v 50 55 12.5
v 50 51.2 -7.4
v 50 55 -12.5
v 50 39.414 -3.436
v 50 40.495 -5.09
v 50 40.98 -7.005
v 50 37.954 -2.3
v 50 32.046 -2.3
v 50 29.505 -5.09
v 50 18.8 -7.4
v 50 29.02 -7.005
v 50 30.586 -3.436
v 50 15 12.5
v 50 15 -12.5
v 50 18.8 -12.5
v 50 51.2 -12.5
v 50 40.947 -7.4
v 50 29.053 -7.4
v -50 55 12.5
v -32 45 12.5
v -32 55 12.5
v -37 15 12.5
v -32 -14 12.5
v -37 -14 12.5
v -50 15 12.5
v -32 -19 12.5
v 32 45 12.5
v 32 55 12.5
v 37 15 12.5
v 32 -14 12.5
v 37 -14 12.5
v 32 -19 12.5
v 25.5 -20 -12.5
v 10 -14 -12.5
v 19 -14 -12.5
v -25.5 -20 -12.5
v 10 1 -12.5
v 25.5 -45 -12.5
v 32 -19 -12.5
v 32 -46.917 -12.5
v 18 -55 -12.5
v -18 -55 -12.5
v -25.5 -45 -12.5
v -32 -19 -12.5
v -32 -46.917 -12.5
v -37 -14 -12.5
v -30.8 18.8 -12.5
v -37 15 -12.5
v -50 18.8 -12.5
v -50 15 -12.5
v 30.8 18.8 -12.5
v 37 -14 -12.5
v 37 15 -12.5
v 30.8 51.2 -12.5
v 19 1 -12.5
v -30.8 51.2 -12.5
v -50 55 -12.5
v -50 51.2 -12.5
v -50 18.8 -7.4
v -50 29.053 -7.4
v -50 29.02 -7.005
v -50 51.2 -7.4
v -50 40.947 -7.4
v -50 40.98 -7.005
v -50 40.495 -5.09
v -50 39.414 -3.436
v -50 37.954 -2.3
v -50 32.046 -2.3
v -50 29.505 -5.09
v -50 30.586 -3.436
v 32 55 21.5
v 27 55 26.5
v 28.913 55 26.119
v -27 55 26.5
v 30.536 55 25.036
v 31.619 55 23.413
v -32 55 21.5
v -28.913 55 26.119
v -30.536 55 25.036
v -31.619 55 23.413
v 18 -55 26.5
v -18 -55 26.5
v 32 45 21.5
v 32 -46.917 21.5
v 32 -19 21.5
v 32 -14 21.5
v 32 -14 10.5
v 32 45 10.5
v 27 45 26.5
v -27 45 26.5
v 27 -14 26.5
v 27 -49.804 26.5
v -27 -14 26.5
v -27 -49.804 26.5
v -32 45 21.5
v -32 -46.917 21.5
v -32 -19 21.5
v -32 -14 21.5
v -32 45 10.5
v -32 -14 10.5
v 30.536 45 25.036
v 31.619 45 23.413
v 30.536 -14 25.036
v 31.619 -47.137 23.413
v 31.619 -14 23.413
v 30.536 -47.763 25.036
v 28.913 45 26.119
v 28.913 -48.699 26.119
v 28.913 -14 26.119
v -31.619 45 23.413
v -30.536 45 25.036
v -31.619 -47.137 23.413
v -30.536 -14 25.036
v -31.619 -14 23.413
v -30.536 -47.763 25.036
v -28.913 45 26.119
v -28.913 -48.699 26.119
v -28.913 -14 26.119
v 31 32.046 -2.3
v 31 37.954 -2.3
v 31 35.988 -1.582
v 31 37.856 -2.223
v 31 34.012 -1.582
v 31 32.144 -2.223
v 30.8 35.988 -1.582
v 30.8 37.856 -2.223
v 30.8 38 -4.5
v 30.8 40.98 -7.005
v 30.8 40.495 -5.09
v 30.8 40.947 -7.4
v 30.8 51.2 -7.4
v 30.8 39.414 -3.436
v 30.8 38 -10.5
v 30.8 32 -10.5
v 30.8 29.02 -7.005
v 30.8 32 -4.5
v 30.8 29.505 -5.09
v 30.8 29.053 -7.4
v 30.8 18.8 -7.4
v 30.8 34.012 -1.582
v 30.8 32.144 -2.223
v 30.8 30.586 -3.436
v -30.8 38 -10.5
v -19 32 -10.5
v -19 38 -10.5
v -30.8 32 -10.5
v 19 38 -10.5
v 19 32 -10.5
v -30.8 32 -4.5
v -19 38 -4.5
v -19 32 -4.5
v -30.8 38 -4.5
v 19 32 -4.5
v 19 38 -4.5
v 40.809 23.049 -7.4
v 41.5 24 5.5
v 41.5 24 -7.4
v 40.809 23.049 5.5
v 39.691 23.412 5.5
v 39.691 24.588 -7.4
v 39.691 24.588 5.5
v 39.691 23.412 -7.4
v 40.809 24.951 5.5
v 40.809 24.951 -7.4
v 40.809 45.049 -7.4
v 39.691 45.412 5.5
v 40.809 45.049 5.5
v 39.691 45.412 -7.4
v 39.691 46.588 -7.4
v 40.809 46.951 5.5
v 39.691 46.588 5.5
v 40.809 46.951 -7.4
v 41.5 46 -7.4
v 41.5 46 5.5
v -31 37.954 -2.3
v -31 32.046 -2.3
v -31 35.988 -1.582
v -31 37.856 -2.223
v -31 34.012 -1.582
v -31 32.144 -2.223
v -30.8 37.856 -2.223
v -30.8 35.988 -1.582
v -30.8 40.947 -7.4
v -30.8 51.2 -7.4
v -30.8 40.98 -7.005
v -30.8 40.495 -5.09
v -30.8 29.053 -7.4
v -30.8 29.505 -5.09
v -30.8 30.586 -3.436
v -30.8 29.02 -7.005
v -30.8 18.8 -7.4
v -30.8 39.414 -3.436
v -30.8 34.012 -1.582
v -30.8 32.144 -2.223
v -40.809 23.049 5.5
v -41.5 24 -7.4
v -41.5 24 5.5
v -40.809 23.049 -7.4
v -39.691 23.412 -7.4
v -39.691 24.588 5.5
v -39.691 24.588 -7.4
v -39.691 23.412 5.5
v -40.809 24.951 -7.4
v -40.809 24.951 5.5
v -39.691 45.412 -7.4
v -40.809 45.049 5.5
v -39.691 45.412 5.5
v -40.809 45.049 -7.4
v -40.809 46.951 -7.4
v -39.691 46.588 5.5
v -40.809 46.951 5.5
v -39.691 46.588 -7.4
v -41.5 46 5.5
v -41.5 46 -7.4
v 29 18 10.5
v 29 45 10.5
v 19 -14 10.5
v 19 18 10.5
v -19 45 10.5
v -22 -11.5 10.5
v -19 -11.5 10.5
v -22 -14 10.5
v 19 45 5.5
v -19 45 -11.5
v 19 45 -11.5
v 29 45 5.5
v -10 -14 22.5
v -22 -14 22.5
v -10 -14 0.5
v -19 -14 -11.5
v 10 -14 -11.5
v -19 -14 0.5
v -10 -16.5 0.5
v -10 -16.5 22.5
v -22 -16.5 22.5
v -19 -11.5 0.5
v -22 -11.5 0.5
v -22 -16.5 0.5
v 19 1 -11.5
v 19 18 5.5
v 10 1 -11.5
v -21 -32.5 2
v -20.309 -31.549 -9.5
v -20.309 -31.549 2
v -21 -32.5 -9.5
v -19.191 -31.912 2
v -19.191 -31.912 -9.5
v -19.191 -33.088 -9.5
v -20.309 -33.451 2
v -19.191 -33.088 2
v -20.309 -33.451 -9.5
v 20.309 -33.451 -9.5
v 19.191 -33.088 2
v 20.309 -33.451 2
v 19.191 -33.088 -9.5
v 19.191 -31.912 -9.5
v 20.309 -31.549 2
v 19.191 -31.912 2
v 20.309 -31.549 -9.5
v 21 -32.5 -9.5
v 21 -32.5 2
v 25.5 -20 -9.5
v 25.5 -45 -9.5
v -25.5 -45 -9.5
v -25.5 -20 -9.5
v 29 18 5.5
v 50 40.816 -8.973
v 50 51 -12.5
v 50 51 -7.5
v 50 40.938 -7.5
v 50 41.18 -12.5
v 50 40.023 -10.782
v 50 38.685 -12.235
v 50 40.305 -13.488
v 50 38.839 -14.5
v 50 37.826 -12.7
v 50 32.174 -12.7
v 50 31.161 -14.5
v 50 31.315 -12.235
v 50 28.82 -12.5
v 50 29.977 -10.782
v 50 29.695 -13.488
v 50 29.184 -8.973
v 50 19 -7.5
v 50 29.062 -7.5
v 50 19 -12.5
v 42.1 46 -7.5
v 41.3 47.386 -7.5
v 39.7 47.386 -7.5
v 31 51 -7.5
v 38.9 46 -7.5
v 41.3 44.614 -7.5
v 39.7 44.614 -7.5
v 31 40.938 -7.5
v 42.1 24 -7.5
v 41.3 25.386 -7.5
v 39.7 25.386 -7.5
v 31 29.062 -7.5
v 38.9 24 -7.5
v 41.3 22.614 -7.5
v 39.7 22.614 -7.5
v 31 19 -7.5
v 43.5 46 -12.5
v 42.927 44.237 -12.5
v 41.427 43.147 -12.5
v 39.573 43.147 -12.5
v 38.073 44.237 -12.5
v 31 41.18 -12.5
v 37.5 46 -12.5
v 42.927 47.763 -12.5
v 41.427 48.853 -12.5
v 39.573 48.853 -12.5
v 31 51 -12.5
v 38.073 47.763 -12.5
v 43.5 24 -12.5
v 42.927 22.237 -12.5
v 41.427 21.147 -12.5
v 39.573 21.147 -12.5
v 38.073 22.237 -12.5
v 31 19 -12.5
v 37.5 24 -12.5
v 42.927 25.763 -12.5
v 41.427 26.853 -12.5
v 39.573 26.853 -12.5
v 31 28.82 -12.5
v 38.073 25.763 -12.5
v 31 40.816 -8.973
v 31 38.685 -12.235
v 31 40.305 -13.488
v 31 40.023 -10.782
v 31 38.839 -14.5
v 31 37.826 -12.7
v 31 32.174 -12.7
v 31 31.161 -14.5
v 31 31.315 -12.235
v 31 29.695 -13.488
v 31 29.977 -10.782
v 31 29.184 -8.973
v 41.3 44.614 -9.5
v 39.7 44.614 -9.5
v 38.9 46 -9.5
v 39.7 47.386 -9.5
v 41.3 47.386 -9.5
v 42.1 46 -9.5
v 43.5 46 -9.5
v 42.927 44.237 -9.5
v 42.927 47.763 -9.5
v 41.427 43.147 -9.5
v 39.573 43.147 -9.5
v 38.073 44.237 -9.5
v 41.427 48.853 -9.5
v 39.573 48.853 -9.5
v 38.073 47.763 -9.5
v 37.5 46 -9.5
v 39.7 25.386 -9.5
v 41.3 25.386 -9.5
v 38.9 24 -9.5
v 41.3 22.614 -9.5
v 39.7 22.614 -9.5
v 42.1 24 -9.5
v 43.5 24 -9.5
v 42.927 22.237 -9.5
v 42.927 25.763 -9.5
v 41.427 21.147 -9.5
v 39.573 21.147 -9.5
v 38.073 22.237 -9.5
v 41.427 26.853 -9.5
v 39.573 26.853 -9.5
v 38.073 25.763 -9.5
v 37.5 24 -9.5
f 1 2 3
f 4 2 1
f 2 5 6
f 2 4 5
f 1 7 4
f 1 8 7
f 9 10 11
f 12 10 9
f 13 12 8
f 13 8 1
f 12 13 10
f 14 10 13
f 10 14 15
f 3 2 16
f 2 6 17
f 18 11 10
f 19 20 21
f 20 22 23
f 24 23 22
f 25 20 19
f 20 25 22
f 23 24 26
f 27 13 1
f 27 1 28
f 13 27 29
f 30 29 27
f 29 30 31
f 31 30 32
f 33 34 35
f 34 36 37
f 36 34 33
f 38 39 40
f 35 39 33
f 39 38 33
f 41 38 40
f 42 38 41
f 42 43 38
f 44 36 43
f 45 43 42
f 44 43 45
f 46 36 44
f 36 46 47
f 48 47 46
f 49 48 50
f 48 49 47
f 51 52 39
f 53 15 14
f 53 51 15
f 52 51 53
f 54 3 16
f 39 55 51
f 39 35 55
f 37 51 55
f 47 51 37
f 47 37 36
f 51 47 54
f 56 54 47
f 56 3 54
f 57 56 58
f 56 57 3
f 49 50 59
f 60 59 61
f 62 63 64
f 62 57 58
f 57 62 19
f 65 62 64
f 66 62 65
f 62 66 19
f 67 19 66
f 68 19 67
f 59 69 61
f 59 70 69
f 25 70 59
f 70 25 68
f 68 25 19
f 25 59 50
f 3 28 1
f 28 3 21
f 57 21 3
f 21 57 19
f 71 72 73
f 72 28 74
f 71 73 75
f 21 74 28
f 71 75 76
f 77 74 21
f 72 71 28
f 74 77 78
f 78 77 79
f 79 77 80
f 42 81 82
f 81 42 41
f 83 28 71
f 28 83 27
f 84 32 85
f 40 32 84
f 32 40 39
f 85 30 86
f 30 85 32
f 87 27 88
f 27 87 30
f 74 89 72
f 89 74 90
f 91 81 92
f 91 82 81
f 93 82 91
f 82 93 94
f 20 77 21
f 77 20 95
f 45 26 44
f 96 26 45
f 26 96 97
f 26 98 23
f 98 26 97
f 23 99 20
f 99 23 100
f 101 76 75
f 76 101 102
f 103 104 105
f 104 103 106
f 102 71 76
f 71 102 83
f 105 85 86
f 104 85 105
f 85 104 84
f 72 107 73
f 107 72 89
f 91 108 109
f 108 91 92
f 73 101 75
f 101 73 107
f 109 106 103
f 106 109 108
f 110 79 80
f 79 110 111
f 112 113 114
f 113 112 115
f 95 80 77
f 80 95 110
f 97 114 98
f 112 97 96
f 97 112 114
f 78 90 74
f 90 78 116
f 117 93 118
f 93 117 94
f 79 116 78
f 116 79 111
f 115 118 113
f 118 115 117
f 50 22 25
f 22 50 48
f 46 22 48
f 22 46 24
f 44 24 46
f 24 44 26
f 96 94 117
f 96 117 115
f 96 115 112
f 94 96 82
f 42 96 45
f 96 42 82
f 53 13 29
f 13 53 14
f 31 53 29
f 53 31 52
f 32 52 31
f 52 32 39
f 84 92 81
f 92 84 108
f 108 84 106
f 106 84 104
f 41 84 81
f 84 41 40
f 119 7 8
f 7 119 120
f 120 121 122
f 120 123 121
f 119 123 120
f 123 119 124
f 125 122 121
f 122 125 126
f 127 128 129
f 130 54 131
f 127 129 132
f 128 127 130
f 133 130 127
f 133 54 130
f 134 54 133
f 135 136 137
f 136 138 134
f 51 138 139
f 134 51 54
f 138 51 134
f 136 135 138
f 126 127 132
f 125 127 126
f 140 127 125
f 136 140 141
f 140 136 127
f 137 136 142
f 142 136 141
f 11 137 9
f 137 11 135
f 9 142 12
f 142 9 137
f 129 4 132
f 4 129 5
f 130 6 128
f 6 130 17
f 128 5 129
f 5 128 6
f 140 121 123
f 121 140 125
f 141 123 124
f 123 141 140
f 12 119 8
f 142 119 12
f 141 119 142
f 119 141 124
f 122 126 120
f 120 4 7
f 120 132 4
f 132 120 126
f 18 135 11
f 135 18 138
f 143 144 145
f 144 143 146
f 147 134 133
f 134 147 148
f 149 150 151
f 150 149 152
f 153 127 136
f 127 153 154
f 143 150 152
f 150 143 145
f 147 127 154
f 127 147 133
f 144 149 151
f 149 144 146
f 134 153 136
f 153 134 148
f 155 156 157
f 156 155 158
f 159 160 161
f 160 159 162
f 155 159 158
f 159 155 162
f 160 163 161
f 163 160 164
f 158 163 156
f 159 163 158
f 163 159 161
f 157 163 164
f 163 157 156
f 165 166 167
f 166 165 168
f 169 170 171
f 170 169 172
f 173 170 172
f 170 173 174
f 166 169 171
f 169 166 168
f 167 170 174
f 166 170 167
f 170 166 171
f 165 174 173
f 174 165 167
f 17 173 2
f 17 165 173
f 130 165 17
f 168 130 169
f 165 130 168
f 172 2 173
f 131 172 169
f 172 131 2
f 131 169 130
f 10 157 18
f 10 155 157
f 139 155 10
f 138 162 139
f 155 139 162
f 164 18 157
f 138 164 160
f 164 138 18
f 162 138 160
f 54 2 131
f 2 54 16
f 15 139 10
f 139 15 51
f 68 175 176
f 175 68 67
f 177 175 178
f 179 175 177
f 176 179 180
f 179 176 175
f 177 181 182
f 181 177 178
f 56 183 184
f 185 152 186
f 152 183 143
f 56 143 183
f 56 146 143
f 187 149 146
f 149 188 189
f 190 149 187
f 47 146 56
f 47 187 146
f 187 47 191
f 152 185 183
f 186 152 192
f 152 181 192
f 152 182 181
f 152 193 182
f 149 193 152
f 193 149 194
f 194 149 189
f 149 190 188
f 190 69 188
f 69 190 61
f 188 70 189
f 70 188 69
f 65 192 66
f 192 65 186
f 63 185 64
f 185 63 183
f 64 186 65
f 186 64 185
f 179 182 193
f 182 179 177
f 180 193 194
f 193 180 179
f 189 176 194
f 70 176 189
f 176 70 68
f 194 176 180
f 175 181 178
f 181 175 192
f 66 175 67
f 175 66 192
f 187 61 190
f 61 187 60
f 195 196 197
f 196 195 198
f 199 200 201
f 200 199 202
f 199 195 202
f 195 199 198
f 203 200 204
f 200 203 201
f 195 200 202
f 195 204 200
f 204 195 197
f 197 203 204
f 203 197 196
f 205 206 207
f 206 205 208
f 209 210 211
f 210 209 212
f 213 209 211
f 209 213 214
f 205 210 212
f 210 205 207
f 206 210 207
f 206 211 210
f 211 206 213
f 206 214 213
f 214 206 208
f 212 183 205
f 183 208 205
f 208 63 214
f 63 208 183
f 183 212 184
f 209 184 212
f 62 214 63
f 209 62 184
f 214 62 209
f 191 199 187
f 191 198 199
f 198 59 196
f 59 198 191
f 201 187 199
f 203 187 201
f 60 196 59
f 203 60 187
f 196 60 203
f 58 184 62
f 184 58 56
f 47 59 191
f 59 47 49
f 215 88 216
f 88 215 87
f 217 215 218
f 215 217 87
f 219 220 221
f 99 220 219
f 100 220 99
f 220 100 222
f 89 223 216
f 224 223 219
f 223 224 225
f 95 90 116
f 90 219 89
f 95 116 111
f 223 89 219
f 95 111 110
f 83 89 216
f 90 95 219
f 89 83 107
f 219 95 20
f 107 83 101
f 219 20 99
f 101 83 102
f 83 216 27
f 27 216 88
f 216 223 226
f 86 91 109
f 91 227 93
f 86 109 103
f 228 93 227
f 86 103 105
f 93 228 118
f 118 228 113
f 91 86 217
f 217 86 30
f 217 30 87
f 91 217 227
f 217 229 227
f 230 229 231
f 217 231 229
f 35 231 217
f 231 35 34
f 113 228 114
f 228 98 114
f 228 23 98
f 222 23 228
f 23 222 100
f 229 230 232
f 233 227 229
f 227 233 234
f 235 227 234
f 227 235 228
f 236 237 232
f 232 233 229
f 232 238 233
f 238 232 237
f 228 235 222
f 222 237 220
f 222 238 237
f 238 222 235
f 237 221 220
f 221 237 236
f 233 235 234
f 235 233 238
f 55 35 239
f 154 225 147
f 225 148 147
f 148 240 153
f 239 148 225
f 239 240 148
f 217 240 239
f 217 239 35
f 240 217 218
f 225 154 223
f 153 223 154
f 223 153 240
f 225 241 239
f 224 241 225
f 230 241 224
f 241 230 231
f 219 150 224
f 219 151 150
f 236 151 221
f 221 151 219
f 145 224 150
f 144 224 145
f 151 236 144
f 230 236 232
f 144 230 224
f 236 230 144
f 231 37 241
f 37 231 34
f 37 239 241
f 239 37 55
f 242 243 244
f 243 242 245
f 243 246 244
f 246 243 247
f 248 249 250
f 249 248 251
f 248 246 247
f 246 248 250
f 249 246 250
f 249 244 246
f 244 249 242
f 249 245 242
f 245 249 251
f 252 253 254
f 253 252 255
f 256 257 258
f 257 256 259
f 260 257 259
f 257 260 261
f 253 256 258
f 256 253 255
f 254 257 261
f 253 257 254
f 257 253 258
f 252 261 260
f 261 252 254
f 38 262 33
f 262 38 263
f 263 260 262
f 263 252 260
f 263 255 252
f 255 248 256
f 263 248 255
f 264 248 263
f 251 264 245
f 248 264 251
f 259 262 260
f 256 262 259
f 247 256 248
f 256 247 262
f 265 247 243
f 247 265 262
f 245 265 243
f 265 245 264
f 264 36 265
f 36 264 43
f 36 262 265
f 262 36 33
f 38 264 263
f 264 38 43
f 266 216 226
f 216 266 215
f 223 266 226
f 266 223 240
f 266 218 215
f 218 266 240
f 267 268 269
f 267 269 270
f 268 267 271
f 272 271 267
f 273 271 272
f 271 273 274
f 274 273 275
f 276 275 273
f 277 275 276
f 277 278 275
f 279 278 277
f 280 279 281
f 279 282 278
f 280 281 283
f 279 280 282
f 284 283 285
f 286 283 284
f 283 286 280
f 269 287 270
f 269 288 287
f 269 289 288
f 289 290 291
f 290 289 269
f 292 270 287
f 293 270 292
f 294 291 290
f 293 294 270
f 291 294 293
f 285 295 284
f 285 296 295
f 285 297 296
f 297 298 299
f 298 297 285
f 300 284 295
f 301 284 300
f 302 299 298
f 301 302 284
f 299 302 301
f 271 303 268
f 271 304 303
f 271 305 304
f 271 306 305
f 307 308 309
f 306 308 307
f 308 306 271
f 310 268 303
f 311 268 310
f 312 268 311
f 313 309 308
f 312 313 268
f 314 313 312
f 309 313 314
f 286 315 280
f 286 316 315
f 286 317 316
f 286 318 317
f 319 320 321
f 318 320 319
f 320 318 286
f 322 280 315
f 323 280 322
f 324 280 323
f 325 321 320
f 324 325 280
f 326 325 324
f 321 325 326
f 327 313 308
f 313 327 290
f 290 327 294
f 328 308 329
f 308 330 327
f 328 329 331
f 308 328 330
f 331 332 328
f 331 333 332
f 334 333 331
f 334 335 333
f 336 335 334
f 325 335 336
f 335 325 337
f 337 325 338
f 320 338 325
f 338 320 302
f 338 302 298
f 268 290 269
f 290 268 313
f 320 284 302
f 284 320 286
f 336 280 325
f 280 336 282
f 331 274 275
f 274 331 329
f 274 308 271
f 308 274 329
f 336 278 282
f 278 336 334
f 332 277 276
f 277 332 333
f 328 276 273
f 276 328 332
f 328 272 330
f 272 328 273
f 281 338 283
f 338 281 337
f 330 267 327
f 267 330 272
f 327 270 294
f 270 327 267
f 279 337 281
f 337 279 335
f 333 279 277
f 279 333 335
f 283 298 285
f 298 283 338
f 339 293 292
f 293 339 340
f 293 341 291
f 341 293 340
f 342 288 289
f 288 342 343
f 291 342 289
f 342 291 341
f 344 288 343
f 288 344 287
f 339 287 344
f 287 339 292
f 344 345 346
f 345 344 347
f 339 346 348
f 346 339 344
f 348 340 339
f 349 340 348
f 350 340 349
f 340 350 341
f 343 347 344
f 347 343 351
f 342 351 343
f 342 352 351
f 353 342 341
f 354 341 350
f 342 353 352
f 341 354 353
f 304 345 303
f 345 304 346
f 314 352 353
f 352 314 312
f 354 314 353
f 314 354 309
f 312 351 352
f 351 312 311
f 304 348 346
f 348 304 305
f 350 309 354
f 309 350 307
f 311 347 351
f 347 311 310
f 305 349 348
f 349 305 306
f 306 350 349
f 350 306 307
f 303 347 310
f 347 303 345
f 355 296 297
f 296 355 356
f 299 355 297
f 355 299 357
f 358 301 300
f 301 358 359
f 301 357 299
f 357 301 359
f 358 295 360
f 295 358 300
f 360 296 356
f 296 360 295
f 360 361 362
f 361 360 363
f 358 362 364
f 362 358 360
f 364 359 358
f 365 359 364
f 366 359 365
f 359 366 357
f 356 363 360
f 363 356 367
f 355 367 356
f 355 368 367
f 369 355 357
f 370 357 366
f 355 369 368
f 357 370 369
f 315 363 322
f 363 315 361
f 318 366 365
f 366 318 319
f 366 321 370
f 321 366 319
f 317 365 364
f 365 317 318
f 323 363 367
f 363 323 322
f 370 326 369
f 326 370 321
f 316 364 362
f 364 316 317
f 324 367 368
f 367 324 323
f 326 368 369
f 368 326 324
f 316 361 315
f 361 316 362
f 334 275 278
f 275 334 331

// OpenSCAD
body_width = 100;
body_length = 110;
body_height = 25;

small_screw_d_thread = 2;
small_screw_d_pass = 3.2;
small_screw_length = 13;
small_screw_head_length = 3;
small_screw_head_d = 6;

motor_d = 12;
motor_height = 10;
motor_length = 19;
motor_back_offset = 20;

cabel_channel_width = 6;

motor_holder_width = 32;
motor_holder_bulge = 16;

battery_box_width = 64;
battery_box_length = 59;
battery_box_depth = 2;
battery_box_height = 14;
battery_box_rounding_r = 5;
battery_box_back_offset = 10;
battery_box_cable_width = 12;
battery_box_cable_length = 5;
battery_box_cable_offset = 10;
battery_box_wall_width = 5;

electronic_cutout_width = 38;
electronic_cutout_length = 59;
electronic_cutout_depth = 22;

gyroscope_width = 16;
gyroscope_length = 27; 
gyroscope_depth = 5;
gyroscope_offset = 10;

button_cutout_length = 15;
button_cutout_width =  9;
button_x_offset = (electronic_cutout_width - button_cutout_width) / 2;
button_y_offset = -(electronic_cutout_length - button_cutout_length) / 2;

ball_wheel_width = 51;
ball_wheel_length = 25;
ball_wheel_depth = 3;
ball_wheel_front_offset = 10;
ball_wheel_screw_distance = 40;

front_width = 36;
front_angle = 30;
front_cutout_depth = tan(front_angle) * (battery_box_width - front_width) / 2;

tolerance = 0.2;

module mirror_copy(vec) {
        mirror(vec) {
            children();
        }
        children();
}

module small_screw_pass_cutout() {
    cylinder(d = small_screw_d_pass, h = small_screw_length, center = true);
    translate([0,0, (small_screw_length + small_screw_head_length) / 2])
        cylinder(d = small_screw_head_d, h = small_screw_head_length, center = true);
}

module small_screw_thread_cutout() {
    cylinder(d = small_screw_d_thread, h = small_screw_length, center = true);
}

module motor_holder() {
    difference() {
        union() {
            cube([motor_length, motor_holder_width, motor_height / 2], center = true);

            translate([0,0,motor_height / 4])
            rotate([0, 90, 0])
                cylinder(d = motor_holder_bulge, h = motor_length, center = true);
        }

        translate([0,0,motor_height / 4])
        rotate([0, 90, 0]) {           
            difference() {
                cylinder(d = motor_d, h = motor_length, center = true);
                    
                mirror_copy([1,0,0]) {
                    translate([(motor_height + 2) / 2 + tolerance, 0, 0])
                    cube([2, motor_d, motor_length], center = true);
                }
            }
        }

        translate([0,0, motor_height / 4 + motor_height / 2])
            cube([motor_length, motor_holder_width, motor_height], center = true);

        translate([0,0, - motor_holder_bulge / 2 + (motor_d - motor_height) / 2 ])
            cube([motor_length, motor_holder_width, motor_height / 2], center = true);

        mirror_copy([0, 1, 0])
        translate([0, motor_holder_width / 2 - 5, (small_screw_length) / 2 + small_screw_head_length - motor_height / 4 ])
        rotate([0, 180, 0])
            small_screw_pass_cutout();
    }
}

module body() {
    width = body_width;
    length = body_length;
    height = body_height;

    module top_rounding() {
        rotate([90, 0, 0]) {
            difference() {
                translate([battery_box_rounding_r / 2, battery_box_rounding_r / 2, 0])
                    cube([battery_box_rounding_r, battery_box_rounding_r, body_length], center = true);

                cylinder(r = battery_box_rounding_r, h = body_length, center=true);
            }
        }
    }

    module side_cutouts() {
        translate([0, 0, battery_box_height / 2])
        linear_extrude(height + battery_box_height, [0, 0, 1], center = true)
        polygon([
            [body_width / 2, -body_length / 2],
            [front_width / 2, -body_length / 2],
            [battery_box_width / 2, -body_length / 2 + front_cutout_depth], 
            [battery_box_width / 2, body_length / 2 - battery_box_back_offset - battery_box_length - battery_box_wall_width],
            [battery_box_width / 2 + battery_box_wall_width, body_length / 2 - battery_box_back_offset - battery_box_length],
            [battery_box_width / 2 + battery_box_wall_width, body_length / 2 - 2 * motor_back_offset],
            [width / 2, body_length / 2 - 2 * motor_back_offset],
        ]);
    }

    module motor_cutouts() {
        rotate([0, 90, 0]) {
            // cable shaft
            channel_length = body_width / 2 - motor_length;

            translate([0, 0, (- channel_length - motor_length) / 2 ])
                cube([cabel_channel_width, cabel_channel_width, channel_length], center = true);
            
            difference() {
                cylinder(d = motor_d, h = motor_length + 2 * tolerance, center = true);
                
                mirror_copy([1,0,0]) {
                    translate([(motor_height + 2) / 2 + tolerance, 0, 0])
                    cube([2, motor_d, motor_length], center = true);
                }
            }
        }
        
        mirror_copy([0,1,0])
        translate([0, motor_holder_width / 2 - 5, small_screw_length / 2]) {
            small_screw_thread_cutout();
        }

        translate([0, 0, -motor_height / 4])
            cube([motor_length + 2 * tolerance, motor_holder_width + 2 * tolerance, motor_height / 2 + tolerance], center = true);
    }
    
    module battery_box_cutout() {
        translate([0,0, battery_box_height / 2])
            cube([battery_box_width, battery_box_length, battery_box_depth + battery_box_height], center = true);

        translate([- battery_box_width / 2 + battery_box_cable_offset + battery_box_cable_width / 2, - battery_box_length / 2, 0])
            cube([battery_box_cable_width, battery_box_cable_length, electronic_cutout_depth], center = true);
    }
    
    module ball_wheel_cutout() {
        cube([ball_wheel_width, 
              ball_wheel_length,
              ball_wheel_depth], center = true);

        mirror_copy([1,0,0])
            translate([ball_wheel_screw_distance / 2,0,small_screw_length / 2])
            small_screw_thread_cutout();
    }
    
    module electronic_cutout() {
        cube([electronic_cutout_width,
              electronic_cutout_length,
              electronic_cutout_depth],
             center = true);

        translate([button_x_offset, button_y_offset, 0])
            cube([button_cutout_width, button_cutout_length, body_height], center = true);
    }

    module gyroscope_cutout() {
        cube([gyroscope_width,
              gyroscope_length, 
              gyroscope_depth], 
             center = true);
    }

    difference() {
        union() {
            cube([width, length, height], center = true);

            translate([0, 0, (height + battery_box_height) / 2])
                cube([battery_box_width, length, battery_box_height], center = true);
        }
            
        mirror_copy([1, 0, 0]) {
            translate([battery_box_width / 2 - battery_box_rounding_r,0, height / 2 + battery_box_height - battery_box_rounding_r])
                top_rounding();
        }

        mirror_copy([1, 0, 0]) {
            side_cutouts();
        }

        mirror_copy([1, 0, 0]) {
            translate([(width - motor_length) / 2, length / 2 - motor_back_offset,
            - (height - motor_height) / 2])
            motor_cutouts();
        }
        
        translate([0, (length - battery_box_length) / 2 - battery_box_back_offset, (height - battery_box_depth) / 2])
            battery_box_cutout();
        
        translate([0,
                   (length - electronic_cutout_length) / 2 - battery_box_back_offset,
                   (height - electronic_cutout_depth) / 2 - battery_box_depth])
            electronic_cutout();

        translate([ (electronic_cutout_width - gyroscope_width) / 2 + gyroscope_offset,
                    (length - gyroscope_length) / 2 - battery_box_back_offset,
                    (height - gyroscope_depth) / 2 - battery_box_depth])
            gyroscope_cutout();
        
        translate([0,
                  (length - ball_wheel_length) / -2 + ball_wheel_front_offset,
                  (height - ball_wheel_depth) / -2
            ])
            ball_wheel_cutout();
    }
}

body();

translate([(body_width - motor_length) / 2,
            body_length / 2 - motor_back_offset,
            - (body_height - motor_height) / 2 - motor_height / 4])
    motor_holder();
    
